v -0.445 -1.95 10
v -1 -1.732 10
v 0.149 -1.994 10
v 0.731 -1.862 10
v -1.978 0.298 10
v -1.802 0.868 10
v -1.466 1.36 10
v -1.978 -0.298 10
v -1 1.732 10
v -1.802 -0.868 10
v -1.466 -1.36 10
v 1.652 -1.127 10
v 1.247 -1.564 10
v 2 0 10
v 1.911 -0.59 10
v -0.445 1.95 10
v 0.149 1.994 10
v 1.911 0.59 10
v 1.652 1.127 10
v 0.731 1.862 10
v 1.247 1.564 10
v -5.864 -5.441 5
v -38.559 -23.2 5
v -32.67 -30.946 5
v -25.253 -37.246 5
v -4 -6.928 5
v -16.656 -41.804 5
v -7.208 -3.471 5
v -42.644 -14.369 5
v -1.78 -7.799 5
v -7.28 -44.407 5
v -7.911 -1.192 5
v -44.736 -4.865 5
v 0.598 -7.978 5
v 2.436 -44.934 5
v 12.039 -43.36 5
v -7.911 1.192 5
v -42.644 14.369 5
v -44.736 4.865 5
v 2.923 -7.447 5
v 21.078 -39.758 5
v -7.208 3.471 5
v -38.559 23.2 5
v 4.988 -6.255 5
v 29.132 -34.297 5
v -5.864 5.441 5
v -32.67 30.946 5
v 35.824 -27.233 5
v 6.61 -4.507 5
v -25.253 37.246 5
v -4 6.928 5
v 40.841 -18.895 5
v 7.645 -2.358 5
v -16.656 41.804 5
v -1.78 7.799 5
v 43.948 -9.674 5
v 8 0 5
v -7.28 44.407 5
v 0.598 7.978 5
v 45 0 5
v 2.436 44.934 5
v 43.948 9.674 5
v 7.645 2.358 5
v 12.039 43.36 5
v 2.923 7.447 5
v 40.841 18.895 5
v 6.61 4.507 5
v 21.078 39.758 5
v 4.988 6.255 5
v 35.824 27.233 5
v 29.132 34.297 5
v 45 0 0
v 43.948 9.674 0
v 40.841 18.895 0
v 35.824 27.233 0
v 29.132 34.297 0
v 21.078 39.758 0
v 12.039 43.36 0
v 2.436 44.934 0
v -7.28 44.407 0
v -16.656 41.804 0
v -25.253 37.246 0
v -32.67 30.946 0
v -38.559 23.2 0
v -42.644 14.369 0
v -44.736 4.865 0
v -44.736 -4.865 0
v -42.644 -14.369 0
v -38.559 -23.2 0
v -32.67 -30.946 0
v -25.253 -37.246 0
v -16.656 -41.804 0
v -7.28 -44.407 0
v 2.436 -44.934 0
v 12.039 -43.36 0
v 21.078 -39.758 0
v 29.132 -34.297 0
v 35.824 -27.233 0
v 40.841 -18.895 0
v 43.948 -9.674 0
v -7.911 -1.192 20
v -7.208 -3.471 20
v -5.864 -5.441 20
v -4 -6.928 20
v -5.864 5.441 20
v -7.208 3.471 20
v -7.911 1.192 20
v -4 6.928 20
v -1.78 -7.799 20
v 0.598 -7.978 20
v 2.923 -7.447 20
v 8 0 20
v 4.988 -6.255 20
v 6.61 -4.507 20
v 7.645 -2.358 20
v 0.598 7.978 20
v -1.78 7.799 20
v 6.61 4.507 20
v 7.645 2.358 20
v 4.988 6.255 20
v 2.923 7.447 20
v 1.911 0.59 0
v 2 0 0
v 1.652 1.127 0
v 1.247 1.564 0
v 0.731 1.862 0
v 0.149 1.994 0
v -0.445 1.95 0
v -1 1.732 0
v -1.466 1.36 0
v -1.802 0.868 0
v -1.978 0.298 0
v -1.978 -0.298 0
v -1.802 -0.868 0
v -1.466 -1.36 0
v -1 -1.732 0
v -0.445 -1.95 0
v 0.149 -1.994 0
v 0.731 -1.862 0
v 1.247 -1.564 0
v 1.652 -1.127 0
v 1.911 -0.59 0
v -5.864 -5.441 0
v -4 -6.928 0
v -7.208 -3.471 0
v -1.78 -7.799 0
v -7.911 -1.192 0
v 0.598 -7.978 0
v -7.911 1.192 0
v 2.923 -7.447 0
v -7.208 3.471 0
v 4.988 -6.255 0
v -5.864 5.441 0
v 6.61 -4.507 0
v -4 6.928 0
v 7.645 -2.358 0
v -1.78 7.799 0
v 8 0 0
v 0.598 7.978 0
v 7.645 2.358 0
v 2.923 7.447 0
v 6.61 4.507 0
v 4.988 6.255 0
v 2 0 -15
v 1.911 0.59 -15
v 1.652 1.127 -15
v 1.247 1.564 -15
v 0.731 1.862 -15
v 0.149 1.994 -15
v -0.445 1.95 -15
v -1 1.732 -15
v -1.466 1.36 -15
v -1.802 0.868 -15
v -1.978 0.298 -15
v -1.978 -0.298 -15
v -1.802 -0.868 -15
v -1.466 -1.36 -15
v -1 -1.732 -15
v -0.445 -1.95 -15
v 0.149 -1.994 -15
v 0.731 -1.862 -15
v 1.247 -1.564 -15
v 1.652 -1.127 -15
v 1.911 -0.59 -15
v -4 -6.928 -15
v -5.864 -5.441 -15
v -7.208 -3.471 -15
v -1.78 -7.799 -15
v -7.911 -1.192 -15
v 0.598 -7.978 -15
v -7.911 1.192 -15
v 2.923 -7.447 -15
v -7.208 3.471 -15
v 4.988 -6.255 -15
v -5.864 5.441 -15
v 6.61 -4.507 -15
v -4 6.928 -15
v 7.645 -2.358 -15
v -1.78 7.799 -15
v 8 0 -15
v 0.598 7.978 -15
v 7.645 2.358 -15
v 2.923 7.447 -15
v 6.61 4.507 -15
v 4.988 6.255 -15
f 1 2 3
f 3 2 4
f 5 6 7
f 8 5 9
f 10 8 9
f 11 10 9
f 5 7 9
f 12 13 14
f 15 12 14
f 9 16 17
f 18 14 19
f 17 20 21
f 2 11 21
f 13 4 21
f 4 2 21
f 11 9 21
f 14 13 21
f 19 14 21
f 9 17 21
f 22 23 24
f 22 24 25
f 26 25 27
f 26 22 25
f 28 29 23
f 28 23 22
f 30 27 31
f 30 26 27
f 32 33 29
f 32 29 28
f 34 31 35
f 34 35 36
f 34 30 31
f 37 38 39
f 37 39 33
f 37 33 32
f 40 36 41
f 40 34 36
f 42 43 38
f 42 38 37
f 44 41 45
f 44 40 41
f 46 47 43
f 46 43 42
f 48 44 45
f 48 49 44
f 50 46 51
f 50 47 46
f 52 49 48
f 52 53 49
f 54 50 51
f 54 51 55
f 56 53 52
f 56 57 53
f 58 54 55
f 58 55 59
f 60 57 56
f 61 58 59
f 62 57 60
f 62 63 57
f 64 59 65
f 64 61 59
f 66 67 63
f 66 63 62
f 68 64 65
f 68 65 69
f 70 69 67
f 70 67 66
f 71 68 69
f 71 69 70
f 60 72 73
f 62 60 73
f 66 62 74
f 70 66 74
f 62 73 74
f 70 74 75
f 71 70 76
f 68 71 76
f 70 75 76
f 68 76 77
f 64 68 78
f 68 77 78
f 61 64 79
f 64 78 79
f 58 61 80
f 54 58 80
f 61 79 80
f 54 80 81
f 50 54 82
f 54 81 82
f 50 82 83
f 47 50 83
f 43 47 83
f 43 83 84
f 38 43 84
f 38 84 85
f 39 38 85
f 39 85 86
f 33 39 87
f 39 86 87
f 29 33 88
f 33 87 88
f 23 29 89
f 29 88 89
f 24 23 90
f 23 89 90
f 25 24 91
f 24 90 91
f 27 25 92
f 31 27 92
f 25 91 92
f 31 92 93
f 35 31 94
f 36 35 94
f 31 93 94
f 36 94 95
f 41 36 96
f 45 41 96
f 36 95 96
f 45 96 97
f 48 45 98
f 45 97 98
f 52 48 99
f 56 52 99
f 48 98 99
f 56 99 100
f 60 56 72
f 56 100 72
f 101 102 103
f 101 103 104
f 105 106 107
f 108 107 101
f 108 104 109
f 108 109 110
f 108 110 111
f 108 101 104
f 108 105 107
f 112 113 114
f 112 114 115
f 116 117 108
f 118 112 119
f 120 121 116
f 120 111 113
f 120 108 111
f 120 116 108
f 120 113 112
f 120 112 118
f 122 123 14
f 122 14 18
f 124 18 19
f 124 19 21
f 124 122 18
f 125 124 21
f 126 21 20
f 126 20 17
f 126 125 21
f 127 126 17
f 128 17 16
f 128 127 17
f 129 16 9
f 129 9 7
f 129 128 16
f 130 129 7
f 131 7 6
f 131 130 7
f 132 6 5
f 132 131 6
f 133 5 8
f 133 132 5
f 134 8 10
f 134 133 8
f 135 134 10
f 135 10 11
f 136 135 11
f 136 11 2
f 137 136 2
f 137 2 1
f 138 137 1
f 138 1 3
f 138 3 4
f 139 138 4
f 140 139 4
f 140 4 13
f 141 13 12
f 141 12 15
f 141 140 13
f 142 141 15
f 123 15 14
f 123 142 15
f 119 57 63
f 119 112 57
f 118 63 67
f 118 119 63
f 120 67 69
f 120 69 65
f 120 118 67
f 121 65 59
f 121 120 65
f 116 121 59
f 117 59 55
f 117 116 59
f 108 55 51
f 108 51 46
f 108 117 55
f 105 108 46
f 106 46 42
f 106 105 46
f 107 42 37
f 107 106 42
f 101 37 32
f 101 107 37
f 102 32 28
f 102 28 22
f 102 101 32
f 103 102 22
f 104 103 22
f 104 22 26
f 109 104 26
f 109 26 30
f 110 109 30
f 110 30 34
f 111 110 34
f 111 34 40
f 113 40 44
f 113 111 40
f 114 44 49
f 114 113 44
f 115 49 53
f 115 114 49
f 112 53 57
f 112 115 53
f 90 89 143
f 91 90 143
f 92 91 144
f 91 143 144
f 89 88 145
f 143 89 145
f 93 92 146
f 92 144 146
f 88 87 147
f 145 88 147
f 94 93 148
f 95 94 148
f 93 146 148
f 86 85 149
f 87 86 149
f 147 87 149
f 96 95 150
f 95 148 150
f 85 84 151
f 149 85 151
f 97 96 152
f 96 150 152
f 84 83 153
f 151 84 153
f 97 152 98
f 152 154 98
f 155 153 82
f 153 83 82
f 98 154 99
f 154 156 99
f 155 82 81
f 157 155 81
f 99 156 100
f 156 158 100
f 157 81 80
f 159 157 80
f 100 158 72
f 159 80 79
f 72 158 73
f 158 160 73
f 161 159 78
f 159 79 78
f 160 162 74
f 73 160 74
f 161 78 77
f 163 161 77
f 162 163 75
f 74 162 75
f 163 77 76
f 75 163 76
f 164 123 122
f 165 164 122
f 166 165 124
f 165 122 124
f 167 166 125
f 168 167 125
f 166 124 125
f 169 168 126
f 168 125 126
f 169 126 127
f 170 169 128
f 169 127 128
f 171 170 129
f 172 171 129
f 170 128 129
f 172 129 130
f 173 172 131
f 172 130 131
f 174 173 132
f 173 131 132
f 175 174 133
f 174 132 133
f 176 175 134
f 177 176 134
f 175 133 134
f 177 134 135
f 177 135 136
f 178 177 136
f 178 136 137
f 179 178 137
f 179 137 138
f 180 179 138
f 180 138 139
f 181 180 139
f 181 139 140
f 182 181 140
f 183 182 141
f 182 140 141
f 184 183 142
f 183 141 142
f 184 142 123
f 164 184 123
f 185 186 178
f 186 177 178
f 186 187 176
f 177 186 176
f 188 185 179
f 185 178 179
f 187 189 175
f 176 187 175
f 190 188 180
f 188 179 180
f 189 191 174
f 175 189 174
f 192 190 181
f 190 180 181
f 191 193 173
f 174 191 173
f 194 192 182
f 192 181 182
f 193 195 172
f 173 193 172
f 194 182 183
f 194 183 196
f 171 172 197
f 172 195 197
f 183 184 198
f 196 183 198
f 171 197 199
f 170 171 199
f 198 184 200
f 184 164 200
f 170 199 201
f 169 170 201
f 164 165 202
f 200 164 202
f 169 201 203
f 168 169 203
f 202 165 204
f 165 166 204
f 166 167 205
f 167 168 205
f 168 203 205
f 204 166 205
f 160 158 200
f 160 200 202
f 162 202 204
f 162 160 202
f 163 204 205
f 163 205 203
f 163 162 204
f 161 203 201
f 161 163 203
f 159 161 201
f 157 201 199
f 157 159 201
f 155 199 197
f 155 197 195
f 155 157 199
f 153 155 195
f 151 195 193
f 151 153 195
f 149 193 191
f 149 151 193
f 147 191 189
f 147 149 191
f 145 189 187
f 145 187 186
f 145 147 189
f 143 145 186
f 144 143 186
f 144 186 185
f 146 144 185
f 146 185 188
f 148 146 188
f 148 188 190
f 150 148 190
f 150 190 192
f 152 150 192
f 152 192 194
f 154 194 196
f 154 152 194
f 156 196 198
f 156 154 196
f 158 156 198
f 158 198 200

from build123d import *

# Parameters (mm, degrees)
SKETCH1_R                = 8
BOSS_EXTRUDE1_DEPTH      = 20
BOSS_EXTRUDE1_DEPTH_BACK = 15
SKETCH2_R                = 45
BOSS_EXTRUDE2_DEPTH      = 5
SKETCH3_R                = 2
CUT_EXTRUDE1_DEPTH       = 10
CUT_EXTRUDE1_DEPTH_BACK  = 15


with BuildPart() as part:
    # Sketch1 → Boss-Extrude1 (new body, two sides)
    with BuildSketch(Plane.XY) as boss_extrude1_sk:
        Circle(SKETCH1_R)
    extrude(amount=BOSS_EXTRUDE1_DEPTH)
    extrude(boss_extrude1_sk.sketch, amount=-BOSS_EXTRUDE1_DEPTH_BACK)

    # Sketch2 → Boss-Extrude2 (add)
    with BuildSketch(Plane.XY):
        Circle(SKETCH2_R)
    extrude(amount=BOSS_EXTRUDE2_DEPTH)

    # Sketch3 → Cut-Extrude1 (cut, two sides)
    with BuildSketch(Plane.XY) as cut_extrude1_sk:
        Circle(SKETCH3_R)
    extrude(amount=CUT_EXTRUDE1_DEPTH, mode=Mode.SUBTRACT)
    extrude(cut_extrude1_sk.sketch, amount=-CUT_EXTRUDE1_DEPTH_BACK, mode=Mode.SUBTRACT)


solid = part.part
